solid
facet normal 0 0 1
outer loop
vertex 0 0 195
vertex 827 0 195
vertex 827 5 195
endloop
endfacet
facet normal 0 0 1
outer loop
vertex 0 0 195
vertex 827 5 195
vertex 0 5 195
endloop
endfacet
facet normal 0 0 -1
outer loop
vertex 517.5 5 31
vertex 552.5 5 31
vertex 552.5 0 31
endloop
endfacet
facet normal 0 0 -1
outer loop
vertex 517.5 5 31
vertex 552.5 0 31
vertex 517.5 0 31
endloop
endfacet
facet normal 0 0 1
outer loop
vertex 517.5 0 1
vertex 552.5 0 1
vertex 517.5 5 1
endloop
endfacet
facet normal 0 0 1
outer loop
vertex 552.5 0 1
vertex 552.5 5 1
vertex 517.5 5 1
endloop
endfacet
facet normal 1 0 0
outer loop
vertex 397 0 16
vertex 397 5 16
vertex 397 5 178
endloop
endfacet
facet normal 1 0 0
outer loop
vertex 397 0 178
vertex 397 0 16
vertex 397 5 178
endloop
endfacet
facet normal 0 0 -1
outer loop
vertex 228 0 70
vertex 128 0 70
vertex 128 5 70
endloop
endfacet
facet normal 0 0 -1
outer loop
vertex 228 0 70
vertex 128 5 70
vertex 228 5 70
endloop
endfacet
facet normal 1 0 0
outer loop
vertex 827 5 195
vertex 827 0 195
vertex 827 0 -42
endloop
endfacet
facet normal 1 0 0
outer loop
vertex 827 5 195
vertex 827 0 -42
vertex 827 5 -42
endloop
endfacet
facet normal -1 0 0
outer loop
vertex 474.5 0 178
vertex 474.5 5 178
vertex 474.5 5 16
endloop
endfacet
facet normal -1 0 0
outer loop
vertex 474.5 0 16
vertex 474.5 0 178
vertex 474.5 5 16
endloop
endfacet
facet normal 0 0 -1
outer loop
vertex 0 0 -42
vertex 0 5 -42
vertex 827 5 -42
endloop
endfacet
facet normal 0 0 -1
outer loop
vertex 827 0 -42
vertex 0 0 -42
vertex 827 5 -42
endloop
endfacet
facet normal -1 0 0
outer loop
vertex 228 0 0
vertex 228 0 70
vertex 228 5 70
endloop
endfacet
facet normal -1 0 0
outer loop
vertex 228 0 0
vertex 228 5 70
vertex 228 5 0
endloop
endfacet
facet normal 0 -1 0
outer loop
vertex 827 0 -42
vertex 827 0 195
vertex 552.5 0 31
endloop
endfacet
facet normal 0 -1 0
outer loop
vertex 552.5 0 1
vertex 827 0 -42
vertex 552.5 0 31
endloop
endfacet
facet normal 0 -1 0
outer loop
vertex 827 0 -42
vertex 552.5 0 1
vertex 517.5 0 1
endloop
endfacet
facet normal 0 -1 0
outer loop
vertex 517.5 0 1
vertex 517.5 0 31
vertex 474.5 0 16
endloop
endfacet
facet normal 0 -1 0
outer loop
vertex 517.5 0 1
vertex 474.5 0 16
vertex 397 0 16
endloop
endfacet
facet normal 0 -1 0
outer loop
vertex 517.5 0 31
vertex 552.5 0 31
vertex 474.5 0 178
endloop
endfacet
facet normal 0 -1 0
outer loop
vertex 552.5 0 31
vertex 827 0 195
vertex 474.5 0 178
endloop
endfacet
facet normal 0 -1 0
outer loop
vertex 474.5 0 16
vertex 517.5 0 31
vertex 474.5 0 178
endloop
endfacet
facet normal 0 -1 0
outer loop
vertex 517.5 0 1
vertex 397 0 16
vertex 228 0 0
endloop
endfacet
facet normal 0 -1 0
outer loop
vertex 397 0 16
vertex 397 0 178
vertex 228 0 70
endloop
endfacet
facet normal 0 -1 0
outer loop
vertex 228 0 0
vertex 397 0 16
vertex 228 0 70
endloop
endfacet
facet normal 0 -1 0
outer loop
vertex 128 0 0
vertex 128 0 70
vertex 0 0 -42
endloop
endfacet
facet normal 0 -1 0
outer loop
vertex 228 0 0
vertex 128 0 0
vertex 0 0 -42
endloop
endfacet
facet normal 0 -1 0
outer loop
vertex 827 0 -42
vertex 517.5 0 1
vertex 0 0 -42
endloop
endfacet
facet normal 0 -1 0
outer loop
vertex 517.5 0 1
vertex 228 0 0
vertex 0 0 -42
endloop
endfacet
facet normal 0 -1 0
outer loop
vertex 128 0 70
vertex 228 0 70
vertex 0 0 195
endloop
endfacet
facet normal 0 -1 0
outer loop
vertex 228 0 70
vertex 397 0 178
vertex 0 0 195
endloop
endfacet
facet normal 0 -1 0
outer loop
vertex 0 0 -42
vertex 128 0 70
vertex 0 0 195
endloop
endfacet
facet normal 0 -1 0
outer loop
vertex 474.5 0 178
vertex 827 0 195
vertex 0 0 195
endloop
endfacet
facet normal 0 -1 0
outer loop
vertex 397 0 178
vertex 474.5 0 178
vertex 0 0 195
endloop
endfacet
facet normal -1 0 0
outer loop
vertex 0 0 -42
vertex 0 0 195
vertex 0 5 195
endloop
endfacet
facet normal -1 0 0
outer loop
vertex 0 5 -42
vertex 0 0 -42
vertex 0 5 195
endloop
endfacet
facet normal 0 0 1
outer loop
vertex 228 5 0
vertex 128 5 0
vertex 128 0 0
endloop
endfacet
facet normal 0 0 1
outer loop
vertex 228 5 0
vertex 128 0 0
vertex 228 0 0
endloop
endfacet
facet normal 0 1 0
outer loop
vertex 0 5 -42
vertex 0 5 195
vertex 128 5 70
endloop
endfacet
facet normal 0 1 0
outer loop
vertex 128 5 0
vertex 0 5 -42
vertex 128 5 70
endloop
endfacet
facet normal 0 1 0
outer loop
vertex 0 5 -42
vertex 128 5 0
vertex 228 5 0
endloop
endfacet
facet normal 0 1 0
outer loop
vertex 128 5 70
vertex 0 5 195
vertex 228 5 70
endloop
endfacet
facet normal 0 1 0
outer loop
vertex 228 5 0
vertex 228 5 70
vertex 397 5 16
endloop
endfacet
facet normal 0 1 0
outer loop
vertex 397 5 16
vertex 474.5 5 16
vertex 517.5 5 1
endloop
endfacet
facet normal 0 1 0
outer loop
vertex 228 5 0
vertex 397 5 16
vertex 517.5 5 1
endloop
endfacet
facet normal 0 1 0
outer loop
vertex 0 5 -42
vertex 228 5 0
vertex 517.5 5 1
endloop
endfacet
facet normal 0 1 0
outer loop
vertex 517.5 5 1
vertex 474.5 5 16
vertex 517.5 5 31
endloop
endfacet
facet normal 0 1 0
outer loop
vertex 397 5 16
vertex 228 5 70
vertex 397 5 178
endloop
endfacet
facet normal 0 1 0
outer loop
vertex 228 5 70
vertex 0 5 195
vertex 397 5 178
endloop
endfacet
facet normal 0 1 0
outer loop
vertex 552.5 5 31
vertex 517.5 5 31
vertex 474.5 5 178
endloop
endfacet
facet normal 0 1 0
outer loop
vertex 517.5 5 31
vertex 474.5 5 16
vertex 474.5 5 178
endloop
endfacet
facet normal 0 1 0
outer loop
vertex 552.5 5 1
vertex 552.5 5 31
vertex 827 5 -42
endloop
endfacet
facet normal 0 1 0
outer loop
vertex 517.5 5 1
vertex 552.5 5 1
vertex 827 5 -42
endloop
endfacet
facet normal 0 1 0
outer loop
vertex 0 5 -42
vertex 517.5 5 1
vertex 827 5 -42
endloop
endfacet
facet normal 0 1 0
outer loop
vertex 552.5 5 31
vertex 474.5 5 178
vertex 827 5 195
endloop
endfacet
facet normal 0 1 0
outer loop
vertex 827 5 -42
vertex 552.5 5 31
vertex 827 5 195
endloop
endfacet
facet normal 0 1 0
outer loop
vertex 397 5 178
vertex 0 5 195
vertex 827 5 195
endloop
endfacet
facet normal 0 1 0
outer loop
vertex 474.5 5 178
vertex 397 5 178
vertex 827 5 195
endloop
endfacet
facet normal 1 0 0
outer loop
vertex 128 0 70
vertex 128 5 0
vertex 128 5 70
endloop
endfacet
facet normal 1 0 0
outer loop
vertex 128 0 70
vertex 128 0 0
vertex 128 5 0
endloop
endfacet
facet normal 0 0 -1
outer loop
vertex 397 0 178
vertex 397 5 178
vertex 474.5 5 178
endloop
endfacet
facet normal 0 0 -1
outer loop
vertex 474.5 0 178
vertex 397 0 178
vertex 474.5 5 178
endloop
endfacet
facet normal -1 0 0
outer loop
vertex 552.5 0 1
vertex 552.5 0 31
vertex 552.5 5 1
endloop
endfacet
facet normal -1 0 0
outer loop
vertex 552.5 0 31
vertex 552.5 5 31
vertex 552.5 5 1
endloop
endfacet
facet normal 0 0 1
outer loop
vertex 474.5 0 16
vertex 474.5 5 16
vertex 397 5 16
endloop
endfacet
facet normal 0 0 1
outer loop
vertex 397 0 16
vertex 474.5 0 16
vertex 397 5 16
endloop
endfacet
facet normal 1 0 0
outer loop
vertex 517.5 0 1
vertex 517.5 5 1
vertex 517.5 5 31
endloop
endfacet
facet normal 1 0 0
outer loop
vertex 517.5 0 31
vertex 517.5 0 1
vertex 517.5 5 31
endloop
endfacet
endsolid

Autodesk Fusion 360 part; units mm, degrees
sketch "Skizze1" plane through (0, 0, 0) normal (0, 1, 0) x (1, 0, 0)
  line L0 (0, 0) -> (827, 0)
  line L1 (827, 0) -> (827, -195)
  line L2 (827, -195) -> (0, -195)
  line L3 (0, -195) -> (0, 0)
  line L4 (0, -195) -> (128, -195)
  line L5 (128, -195) -> (128, -70)
  line L6 (128, -70) -> (228, -70)
  line L7 (228, -70) -> (228, 0)
  line L8 (228, 0) -> (128, 0)
  line L9 (128, 0) -> (128, -70)
  dimension "d1" = 827
  dimension "d2" = 195
  dimension "d3" = 128
  dimension "d4" = 125
  dimension "d5" = 100
  dimension "d6" = 70
extrude "Extrusion1" add sketch "Skizze1" along normal blind 5 contours L0 L2 L3 L4 L5 L9 | L0 L1 L2 L5 L6 L7
extrude "Extrusion2" add 2 faces at (427.6667, 1.6667, 0) (42.6667, 3.3333, 0) along direction (0, 0, -1) blind 1
sketch "Skizze2" plane through (0, 5, 0) normal (0, 1, 0) x (-1, 0, 0)
  line L0 (0, 195) -> (-827, 195)
  line L1 (-827, 195) -> (-827, -1)
  line L2 (-827, -1) -> (-228, -1)
  line L3 (-228, -1) -> (-228, 70)
  line L4 (-228, 70) -> (-128, 70)
  line L5 (-128, 70) -> (-128, -1)
  line L6 (-128, -1) -> (0, -1)
  line L7 (0, -1) -> (0, 195)
  line L8 (-128, -1) -> (-228, -1)
  line L9 (-128, -1) -> (-128, 0)
  line L10 (-128, 0) -> (-228, 0)
  line L11 (-228, -1) -> (-228, 0)
extrude "Extrusion3" add sketch "Skizze2" against normal blind 5 contours L3 L5 L8 L9 L10 L11
sketch "Skizze3" plane through (0, 5, 0) normal (0, 1, 0) x (-1, 0, 0)
  line L0 (-228, 0) -> (-228, 70)
  line L1 (-228, 70) -> (-128, 70)
  line L2 (-128, 70) -> (-128, 0)
  line L3 (-128, 0) -> (-228, 0)
  line L4 (-827, -1) -> (0, -1)
  line L5 (0, -1) -> (0, 195)
  line L6 (0, 195) -> (-827, 195)
  line L7 (-827, 195) -> (-827, -1)
  line L8 (0, 195) -> (-354, 195)
  line L9 (-354, 195) -> (-354, 178)
  line L10 (-354, 178) -> (-431.5, 178)
  line L11 (-431.5, 178) -> (-431.5, 16)
  line L12 (-431.5, 16) -> (-354, 16)
  line L13 (-354, 16) -> (-354, 178)
  dimension "d13" = 354
  dimension "d14" = 17
  dimension "d15" = 77.5
  dimension "d16" = 162
extrude "Extrusion4" cut sketch "Skizze3" against normal blind 5 contours L10 L11 L12 L13
sketch "Skizze4" plane through (0, 5, 0) normal (0, 1, 0) x (-1, 0, 0)
  line L0 (-431.5, 178) -> (-354, 178)
  line L1 (-354, 178) -> (-354, 16)
  line L2 (-354, 16) -> (-431.5, 16)
  line L3 (-228, 0) -> (-228, 70)
  line L4 (-228, 70) -> (-128, 70)
  line L5 (-128, 70) -> (-128, 0)
  line L6 (-128, 0) -> (-228, 0)
  line L7 (-827, -1) -> (0, -1)
  line L8 (0, -1) -> (0, 195)
  line L9 (0, 195) -> (-827, 195)
  line L10 (-827, 195) -> (-827, -1)
  line L11 (-827, -1) -> (-531, -1)
  line L12 (-531, -1) -> (-531, 195)
  line L13 (-531, 195) -> (-531, 33)
  line L14 (-531, 33) -> (-496, 33)
  line L15 (-496, 33) -> (-496, 3)
  line L16 (-496, 3) -> (-531, 3)
  line L17 (-531, 3) -> (-531, 33)
  line L18 (-431.5, 16) -> (-474.5, 16)
  line L19 (-474.5, 16) -> (-397, 16)
  line L20 (-397, 16) -> (-397, 178)
  line L21 (-397, 178) -> (-474.5, 178)
  line L22 (-474.5, 178) -> (-474.5, 16)
  dimension "d19" = 296
  dimension "d20" = 162
  dimension "d21" = 35
  dimension "d22" = 30
  dimension "d23" = 43
  dimension "d24" = 162
  dimension "d25" = 77.5
extrude "Extrusion5" add sketch "Skizze4" against normal blind 5 contours L0 L1 L2 L20
sketch "Skizze5" plane through (0, 5, 0) normal (0, 1, 0) x (-1, 0, 0)
extrude "Extrusion6" cut sketch "Skizze4" against normal blind 40 contours L0 L2 L18 L19 L20 L21 L22
sketch "Skizze6" plane through (0, 5, 0) normal (0, 1, 0) x (-1, 0, 0)
  line L0 (-827, -1) -> (0, -1)
  line L1 (0, -1) -> (0, 195)
  line L2 (0, 195) -> (-827, 195)
  line L3 (-827, 195) -> (-827, -1)
  line L4 (-228, 0) -> (-228, 70)
  line L5 (-228, 70) -> (-128, 70)
  line L6 (-128, 70) -> (-128, 0)
  line L7 (-128, 0) -> (-228, 0)
  line L8 (-397, 16) -> (-474.5, 16)
  line L9 (-474.5, 16) -> (-474.5, 178)
  line L10 (-474.5, 178) -> (-397, 178)
  line L11 (-397, 178) -> (-397, 16)
  line L12 (-474.5, 16) -> (-517.5, 16)
  line L13 (-827, 195) -> (-827, 31)
  line L14 (-827, 31) -> (-474.5, 31)
  line L15 (-517.5, 16) -> (-517.5, 31)
  line L16 (-517.5, 31) -> (-552.5, 31)
  line L17 (-552.5, 31) -> (-552.5, 1)
  line L18 (-552.5, 1) -> (-517.5, 1)
  line L19 (-517.5, 1) -> (-517.5, 31)
  dimension "d30" = 43
  dimension "d31" = 164
  dimension "d32" = 35
  dimension "d33" = 30
extrude "Extrusion7" cut sketch "Skizze6" against normal blind 50 contours L14 L15 L16 L17 L18 L19
extrude "Extrusion8" add 1 faces at (275.6667, 3.3333, -1) along direction (0, 0, -1) blind 41
